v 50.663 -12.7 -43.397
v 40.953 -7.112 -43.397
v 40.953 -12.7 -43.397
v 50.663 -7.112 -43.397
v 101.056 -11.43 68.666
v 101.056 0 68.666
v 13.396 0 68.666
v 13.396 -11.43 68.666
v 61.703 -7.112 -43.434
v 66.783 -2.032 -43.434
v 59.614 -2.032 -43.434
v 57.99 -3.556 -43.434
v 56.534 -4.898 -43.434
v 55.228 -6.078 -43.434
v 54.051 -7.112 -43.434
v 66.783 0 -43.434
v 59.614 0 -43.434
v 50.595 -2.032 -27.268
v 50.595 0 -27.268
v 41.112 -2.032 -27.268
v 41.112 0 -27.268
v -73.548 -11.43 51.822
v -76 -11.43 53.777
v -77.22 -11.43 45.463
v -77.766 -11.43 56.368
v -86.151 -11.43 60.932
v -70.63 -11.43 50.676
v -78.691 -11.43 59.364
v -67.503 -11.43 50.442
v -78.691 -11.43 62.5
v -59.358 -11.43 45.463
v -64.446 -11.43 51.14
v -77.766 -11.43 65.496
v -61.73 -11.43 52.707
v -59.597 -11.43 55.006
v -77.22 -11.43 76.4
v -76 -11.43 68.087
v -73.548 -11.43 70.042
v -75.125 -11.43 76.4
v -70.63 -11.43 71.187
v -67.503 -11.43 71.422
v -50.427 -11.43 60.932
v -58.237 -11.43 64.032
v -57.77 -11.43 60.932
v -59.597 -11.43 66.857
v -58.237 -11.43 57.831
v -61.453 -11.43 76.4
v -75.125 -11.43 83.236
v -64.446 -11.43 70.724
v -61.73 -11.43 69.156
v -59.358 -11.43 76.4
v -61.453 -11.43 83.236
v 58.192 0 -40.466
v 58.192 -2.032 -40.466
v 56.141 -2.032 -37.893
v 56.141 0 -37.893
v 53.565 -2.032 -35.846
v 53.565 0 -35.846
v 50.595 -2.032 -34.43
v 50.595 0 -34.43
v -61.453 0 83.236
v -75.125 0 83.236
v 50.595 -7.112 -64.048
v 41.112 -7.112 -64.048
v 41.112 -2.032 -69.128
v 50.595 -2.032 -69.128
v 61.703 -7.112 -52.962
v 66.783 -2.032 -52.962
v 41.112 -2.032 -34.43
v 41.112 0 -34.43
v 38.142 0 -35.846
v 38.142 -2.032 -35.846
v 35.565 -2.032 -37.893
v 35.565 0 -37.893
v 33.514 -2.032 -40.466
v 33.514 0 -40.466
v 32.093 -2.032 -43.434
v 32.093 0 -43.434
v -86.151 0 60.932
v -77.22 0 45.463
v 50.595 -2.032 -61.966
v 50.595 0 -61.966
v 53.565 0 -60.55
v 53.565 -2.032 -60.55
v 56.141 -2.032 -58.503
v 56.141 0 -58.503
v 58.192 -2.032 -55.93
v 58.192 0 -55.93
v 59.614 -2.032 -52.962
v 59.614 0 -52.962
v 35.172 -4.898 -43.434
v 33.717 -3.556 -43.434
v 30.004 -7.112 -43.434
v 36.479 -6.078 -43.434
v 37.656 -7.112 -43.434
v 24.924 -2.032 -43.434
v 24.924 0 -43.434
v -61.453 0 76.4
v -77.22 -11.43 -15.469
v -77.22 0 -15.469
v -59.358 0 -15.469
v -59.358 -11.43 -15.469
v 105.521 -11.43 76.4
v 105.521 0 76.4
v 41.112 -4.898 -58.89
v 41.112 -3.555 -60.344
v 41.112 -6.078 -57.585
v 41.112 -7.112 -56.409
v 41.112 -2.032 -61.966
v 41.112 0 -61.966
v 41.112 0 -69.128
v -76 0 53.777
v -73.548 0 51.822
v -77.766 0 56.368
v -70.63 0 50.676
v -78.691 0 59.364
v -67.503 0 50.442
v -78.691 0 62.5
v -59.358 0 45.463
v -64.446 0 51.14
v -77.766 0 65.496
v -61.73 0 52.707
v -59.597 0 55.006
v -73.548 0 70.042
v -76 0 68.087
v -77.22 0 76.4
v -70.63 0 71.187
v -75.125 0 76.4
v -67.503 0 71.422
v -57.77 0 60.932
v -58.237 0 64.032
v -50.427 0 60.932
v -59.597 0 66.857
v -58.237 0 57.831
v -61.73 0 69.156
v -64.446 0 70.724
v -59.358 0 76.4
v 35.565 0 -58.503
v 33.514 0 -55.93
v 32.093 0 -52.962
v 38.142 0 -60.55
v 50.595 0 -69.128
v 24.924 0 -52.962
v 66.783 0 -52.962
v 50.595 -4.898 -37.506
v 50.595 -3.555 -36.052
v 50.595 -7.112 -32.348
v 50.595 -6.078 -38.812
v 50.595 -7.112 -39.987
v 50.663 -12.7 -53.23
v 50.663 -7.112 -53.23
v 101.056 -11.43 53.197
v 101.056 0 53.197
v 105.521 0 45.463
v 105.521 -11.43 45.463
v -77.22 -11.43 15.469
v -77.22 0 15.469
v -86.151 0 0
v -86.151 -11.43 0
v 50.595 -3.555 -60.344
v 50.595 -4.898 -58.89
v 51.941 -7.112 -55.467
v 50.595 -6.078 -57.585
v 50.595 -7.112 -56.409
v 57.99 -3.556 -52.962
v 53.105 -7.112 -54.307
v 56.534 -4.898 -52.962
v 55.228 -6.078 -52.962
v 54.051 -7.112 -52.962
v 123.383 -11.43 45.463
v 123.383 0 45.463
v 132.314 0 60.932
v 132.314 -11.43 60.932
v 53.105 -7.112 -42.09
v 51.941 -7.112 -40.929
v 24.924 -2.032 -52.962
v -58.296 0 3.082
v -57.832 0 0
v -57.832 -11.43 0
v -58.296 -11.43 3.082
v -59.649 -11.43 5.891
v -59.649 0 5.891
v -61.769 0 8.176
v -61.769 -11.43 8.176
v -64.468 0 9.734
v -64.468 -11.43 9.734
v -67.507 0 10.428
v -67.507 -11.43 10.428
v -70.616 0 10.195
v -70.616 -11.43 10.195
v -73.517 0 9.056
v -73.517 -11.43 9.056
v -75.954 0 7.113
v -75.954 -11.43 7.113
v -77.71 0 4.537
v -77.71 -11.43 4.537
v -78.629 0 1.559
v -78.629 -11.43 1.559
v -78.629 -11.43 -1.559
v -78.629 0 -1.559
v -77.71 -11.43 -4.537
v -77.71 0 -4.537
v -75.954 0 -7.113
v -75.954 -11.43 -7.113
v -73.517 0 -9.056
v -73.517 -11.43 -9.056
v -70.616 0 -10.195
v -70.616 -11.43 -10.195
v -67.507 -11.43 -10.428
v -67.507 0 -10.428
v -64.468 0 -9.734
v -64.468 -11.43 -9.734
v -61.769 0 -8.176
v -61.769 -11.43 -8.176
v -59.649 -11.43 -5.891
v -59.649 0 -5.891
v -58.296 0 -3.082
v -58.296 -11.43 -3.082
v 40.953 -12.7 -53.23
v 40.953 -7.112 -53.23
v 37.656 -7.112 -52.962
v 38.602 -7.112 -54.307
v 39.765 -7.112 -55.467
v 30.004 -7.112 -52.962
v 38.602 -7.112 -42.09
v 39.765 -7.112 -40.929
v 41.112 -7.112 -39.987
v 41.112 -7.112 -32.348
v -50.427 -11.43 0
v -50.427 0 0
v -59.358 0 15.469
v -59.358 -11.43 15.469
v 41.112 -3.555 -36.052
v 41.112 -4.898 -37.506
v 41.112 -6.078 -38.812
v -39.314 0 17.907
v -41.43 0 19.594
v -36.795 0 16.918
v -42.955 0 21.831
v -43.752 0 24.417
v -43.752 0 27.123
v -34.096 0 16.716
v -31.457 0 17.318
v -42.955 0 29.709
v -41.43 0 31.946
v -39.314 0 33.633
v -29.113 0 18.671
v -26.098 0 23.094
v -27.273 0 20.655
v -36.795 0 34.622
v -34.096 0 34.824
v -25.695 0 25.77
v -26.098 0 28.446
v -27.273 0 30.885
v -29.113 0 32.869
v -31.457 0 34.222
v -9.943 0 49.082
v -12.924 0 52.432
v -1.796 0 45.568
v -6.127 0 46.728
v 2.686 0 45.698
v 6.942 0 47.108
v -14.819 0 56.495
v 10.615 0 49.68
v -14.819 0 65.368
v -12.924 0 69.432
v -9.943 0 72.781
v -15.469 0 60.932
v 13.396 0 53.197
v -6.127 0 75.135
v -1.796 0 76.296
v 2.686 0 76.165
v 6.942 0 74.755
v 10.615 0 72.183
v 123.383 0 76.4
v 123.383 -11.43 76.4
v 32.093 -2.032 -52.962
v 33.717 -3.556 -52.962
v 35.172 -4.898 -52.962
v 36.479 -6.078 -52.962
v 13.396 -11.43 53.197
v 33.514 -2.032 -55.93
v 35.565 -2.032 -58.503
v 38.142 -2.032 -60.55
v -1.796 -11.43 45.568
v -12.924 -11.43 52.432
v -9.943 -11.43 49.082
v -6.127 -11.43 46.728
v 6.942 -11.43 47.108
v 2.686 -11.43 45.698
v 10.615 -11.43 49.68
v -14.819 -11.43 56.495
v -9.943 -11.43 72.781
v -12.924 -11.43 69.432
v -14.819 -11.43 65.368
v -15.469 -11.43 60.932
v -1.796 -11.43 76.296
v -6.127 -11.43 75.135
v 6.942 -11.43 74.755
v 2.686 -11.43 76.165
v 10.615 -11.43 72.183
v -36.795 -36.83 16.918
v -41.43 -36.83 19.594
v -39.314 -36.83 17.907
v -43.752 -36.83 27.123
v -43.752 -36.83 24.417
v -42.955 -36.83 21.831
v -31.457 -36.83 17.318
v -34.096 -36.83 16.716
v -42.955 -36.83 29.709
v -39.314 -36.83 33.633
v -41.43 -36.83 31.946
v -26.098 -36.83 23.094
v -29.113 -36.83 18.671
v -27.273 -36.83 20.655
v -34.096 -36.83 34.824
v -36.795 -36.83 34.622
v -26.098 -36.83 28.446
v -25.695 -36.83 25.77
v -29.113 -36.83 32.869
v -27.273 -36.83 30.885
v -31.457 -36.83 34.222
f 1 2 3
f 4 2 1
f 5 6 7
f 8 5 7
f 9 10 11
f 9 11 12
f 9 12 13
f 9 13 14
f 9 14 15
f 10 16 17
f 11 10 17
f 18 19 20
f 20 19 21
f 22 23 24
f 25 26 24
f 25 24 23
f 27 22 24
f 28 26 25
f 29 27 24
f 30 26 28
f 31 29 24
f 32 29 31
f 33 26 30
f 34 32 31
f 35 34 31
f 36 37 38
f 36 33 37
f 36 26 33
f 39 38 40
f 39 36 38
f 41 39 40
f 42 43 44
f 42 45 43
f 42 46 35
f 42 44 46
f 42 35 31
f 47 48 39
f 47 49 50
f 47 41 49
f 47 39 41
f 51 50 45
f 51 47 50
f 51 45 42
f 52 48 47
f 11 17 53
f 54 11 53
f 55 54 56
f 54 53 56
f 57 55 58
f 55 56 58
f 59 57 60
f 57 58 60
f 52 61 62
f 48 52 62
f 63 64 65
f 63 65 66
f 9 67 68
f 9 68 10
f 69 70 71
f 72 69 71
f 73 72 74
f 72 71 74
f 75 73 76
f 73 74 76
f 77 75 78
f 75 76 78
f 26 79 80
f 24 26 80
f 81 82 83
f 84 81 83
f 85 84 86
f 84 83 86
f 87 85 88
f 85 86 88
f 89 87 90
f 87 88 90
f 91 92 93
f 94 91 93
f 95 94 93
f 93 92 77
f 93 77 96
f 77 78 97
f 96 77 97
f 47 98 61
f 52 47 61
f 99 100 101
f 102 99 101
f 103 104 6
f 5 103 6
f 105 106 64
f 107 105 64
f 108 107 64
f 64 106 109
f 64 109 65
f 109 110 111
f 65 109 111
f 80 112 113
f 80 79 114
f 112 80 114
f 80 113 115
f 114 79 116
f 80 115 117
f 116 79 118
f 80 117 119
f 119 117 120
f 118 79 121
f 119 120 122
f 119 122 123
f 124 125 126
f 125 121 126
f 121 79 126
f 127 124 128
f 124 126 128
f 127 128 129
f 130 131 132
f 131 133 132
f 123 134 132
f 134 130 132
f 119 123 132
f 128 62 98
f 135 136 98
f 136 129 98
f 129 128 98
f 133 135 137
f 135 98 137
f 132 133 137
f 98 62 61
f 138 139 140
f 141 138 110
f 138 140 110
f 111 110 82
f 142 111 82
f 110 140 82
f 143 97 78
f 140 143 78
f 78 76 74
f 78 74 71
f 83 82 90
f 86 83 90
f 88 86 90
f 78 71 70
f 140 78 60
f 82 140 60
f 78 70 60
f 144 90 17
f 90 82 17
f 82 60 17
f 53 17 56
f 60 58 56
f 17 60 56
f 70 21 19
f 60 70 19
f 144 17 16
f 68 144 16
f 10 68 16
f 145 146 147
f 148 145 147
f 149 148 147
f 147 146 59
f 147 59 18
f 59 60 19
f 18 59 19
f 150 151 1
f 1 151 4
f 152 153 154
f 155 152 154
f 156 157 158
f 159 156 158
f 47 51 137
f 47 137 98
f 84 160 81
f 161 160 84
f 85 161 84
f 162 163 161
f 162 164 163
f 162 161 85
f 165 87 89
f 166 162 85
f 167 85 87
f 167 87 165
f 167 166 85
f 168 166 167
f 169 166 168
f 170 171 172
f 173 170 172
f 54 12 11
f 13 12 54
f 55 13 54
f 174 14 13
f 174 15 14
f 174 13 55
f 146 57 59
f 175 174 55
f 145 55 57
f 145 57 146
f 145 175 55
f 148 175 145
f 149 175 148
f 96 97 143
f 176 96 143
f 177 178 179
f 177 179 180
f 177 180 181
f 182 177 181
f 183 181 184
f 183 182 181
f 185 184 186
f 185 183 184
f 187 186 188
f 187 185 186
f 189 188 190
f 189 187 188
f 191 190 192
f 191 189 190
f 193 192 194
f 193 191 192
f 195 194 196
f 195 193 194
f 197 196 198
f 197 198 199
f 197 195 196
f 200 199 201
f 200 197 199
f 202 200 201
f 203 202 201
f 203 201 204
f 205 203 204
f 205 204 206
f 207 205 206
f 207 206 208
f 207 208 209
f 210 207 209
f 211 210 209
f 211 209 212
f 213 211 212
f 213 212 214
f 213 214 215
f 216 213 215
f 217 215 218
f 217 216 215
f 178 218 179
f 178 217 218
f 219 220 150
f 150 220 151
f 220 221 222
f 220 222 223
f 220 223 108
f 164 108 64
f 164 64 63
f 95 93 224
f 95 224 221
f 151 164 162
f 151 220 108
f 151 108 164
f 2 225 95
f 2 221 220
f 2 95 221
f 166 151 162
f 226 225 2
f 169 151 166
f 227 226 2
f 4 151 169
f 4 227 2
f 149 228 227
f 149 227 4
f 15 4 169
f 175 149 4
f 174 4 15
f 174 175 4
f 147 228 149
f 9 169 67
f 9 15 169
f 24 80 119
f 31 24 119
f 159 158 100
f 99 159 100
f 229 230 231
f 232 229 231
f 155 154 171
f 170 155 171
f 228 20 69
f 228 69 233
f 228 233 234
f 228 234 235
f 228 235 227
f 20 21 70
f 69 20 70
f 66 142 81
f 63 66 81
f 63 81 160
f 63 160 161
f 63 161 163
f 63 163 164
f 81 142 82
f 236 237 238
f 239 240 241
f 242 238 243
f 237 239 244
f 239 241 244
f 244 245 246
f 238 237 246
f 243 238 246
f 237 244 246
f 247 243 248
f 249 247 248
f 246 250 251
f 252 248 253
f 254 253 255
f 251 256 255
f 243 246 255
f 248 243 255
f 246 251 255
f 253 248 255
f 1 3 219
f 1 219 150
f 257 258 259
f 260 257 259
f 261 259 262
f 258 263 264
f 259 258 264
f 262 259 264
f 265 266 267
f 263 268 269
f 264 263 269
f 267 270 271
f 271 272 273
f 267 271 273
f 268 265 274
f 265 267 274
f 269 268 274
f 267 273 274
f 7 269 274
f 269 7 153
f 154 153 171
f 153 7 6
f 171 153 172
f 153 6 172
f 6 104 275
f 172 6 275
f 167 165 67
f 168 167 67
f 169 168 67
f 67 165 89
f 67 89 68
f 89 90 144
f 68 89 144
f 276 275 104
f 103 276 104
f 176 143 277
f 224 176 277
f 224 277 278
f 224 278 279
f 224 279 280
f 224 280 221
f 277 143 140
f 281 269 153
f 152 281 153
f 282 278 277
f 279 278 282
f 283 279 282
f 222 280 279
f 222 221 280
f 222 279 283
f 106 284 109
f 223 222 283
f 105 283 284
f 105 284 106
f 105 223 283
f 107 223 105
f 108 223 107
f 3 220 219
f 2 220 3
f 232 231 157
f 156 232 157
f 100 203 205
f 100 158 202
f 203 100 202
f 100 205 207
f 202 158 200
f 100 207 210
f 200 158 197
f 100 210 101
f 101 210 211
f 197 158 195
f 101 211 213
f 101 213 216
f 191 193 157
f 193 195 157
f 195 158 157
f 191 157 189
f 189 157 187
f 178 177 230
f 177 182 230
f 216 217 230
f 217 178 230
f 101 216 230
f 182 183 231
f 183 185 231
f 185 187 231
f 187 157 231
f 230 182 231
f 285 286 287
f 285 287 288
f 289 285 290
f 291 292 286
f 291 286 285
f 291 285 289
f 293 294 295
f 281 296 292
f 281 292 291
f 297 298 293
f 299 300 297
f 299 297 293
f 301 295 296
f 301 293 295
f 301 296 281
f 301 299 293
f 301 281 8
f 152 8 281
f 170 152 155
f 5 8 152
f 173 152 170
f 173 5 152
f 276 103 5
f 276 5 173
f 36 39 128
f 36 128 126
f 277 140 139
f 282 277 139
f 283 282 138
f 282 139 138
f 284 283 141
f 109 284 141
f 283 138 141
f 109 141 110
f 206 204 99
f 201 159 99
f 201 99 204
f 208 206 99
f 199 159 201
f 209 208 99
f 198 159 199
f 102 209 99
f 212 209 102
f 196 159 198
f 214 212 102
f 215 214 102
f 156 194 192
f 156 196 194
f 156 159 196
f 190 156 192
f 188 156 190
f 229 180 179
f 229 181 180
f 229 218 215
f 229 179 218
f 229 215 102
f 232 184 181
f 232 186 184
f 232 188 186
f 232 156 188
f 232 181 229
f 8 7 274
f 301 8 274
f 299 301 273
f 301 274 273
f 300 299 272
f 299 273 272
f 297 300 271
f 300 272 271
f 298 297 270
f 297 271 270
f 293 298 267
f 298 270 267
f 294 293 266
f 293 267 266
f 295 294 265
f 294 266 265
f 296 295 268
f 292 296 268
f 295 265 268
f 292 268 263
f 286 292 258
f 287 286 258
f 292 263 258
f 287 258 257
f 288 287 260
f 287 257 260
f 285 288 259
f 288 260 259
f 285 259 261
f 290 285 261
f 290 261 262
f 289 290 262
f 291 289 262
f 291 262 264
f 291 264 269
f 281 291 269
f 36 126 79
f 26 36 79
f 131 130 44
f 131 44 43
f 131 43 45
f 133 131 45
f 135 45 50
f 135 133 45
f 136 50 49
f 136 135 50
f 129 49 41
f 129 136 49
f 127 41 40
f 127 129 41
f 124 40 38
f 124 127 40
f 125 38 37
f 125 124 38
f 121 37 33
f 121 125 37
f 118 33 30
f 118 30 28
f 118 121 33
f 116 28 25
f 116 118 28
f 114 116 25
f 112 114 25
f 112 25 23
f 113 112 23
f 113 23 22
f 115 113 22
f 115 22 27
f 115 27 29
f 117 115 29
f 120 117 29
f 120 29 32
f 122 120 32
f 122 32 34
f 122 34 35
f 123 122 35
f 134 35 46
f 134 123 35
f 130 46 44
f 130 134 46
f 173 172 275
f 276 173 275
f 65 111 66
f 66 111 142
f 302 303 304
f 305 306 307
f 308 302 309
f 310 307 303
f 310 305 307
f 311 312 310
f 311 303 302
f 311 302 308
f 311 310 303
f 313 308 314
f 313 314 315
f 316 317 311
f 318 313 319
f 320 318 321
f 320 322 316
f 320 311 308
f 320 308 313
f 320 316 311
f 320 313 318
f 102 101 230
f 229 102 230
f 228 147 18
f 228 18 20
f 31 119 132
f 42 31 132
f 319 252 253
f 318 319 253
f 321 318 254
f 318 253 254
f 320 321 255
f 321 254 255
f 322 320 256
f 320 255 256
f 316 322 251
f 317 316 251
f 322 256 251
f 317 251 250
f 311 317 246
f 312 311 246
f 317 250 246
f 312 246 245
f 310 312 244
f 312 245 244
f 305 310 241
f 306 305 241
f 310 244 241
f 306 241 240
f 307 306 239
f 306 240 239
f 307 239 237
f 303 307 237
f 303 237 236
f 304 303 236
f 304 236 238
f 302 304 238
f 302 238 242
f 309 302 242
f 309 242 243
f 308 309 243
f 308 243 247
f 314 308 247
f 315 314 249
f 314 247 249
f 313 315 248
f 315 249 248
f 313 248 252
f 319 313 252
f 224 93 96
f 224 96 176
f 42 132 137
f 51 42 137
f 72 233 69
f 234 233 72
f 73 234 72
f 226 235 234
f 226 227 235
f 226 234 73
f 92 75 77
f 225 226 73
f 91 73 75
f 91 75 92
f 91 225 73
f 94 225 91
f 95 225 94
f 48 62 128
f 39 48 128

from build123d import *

# Parameters (mm, degrees)
F0_R      = 10.519302146
F1_DEPTH  = 11.43
F0_R_2    = 10.4571143602
F4_DEPTH  = 7.112
F5_SIZE   = 5.08
F6_W      = 9.7099430859
F6_H      = 9.8328515887
F7_DEPTH  = 12.7
F8_R      = 9.0793803352
F9_DEPTH  = 36.83
F10_DEPTH = 36.83


with BuildPart() as f1:
    # F0 (on Front) → F1 (new body)
    with BuildSketch(Plane.XZ):
        Polygon((-75.1246213913, 76.4004662633), (-77.2196794092, 76.4004662633), (-86.1505557177, 60.9317347407), (-77.2196794092, 45.4630032182), (-59.357926792, 45.4630032182), (-50.4270504834, 60.9317347407), (-59.357926792, 76.4004662633), (-61.4529848099, 76.4004662633), (-61.4529848099, 69.5646479726), (-68.2888031006, 76.4004662633), (-75.1246213913, 69.5646479726), align=None)
        with Locations((-68.2888031006, 60.9317347407)):
            Circle(F0_R, mode=Mode.SUBTRACT)
        Polygon((-75.1246213913, 83.236284554), (-75.1246213913, 76.4004662633), (-68.2888031006, 76.4004662633), (-61.4529848099, 76.4004662633), (-61.4529848099, 83.236284554), align=None)
        Polygon((-68.2888031006, 76.4004662633), (-75.1246213913, 76.4004662633), (-75.1246213913, 69.5646479726), align=None)
        Polygon((-61.4529848099, 76.4004662633), (-68.2888031006, 76.4004662633), (-61.4529848099, 69.5646479726), align=None)
    extrude(amount=F1_DEPTH)


with BuildPart() as f1b:
    # F0 (on Front) → F1, piece 2 (new body)
    with BuildSketch(Plane.XZ):
        with BuildLine():
            ThreePointArc((15.4687315226, 60.9317347407), (14.9416472776, 64.9353370624), (13.3963144629, 68.666100502))
            Line((13.3963144629, 68.666100502), (13.3963144629, 53.1973689795))
            ThreePointArc((13.3963144629, 53.1973689795), (14.9416472776, 56.9281324191), (15.4687315226, 60.9317347407))
        make_face()
        with BuildLine():
            Line((101.0556601675, 68.666100502), (13.3963144629, 68.666100502))
            ThreePointArc((13.3963144629, 68.666100502), (14.9416472776, 64.9353370624), (15.4687315226, 60.9317347407))
            ThreePointArc((15.4687315226, 60.9317347407), (14.9416472776, 56.9281324191), (13.3963144629, 53.1973689795))
            Line((13.3963144629, 53.1973689795), (101.0556601675, 53.1973689795))
            Line((101.0556601675, 53.1973689795), (96.5902220132, 60.9317347407))
            Line((96.5902220132, 60.9317347407), (101.0556601675, 68.666100502))
        make_face()
        with BuildLine():
            Line((13.3963144629, 53.1973689795), (13.3963144629, 68.666100502))
            ThreePointArc((13.3963144629, 68.666100502), (-15.4687315226, 60.9317347407), (13.3963144629, 53.1973689795))
        make_face()
        Polygon((105.5210983218, 76.4004662633), (101.0556601675, 68.666100502), (114.4519746304, 68.666100502), (114.4519746304, 53.1973689795), (101.0556601675, 53.1973689795), (105.5210983218, 45.4630032182), (123.3828509389, 45.4630032182), (132.3137272475, 60.9317347407), (123.3828509389, 76.4004662633), align=None)
        Polygon((114.4519746304, 68.666100502), (101.0556601675, 68.666100502), (96.5902220132, 60.9317347407), (101.0556601675, 53.1973689795), (114.4519746304, 53.1973689795), align=None)
    extrude(amount=F1_DEPTH)


with BuildPart() as f1c:
    # F0 (on Front) → F1, piece 3 (new body)
    with BuildSketch(Plane.XZ):
        Polygon((-59.357926792, -15.4687315226), (-50.4270504834, 0), (-59.357926792, 15.4687315226), (-77.2196794092, 15.4687315226), (-86.1505557177, 0), (-77.2196794092, -15.4687315226), align=None)
        with Locations((-68.2888031006, 0)):
            Circle(F0_R_2, mode=Mode.SUBTRACT)
    extrude(amount=F1_DEPTH)


with BuildPart() as f4:
    # F3 (on Front) → F4 (new body)
    with BuildSketch(Plane.XZ):
        with BuildLine():
            ThreePointArc((59.6135334386, -52.9624782503), (60.2132493643, -50.6137481904), (60.4150185059, -48.1980741024))
            ThreePointArc((60.4150185059, -48.1980741024), (60.2132493643, -45.7824000144), (59.6135334386, -43.4336699545))
            Line((59.6135334386, -43.4336699545), (50.5945459008, -43.4336699545))
            Line((50.5945459008, -43.4336699545), (50.5945459008, -52.9624782503))
            Line((50.5945459008, -52.9624782503), (59.6135334386, -52.9624782503))
        make_face()
        with BuildLine():
            ThreePointArc((59.6135334386, -43.4336699545), (60.2132493643, -45.7824000144), (60.4150185059, -48.1980741024))
            ThreePointArc((60.4150185059, -48.1980741024), (60.2132493643, -50.6137481904), (59.6135334386, -52.9624782503))
            Line((59.6135334386, -52.9624782503), (66.783182323, -52.9624782503))
            Line((66.783182323, -52.9624782503), (66.783182323, -43.4336699545))
            Line((66.783182323, -43.4336699545), (59.6135334386, -43.4336699545))
        make_face()
        with BuildLine():
            Line((50.5945459008, -43.4336699545), (59.6135334386, -43.4336699545))
            ThreePointArc((59.6135334386, -43.4336699545), (56.1413204063, -37.8927413191), (50.5945459008, -34.4298745776))
            Line((50.5945459008, -34.4298745776), (50.5945459008, -43.4336699545))
        make_face()
        with BuildLine():
            ThreePointArc((50.5945459008, -61.9662736272), (56.1413204063, -58.5034068857), (59.6135334386, -52.9624782503))
            Line((59.6135334386, -52.9624782503), (50.5945459008, -52.9624782503))
            Line((50.5945459008, -52.9624782503), (50.5945459008, -61.9662736272))
        make_face()
        with BuildLine():
            Line((50.5945459008, -43.4336699545), (50.5945459008, -34.4298745776))
            ThreePointArc((50.5945459008, -34.4298745776), (45.8533465862, -33.6364021827), (41.1121472716, -34.4298745776))
            Line((41.1121472716, -34.4298745776), (41.1121472716, -43.4336699545))
            Line((41.1121472716, -43.4336699545), (50.5945459008, -43.4336699545))
        make_face()
        with BuildLine():
            ThreePointArc((41.1121472716, -34.4298745776), (45.8533465862, -33.6364021827), (50.5945459008, -34.4298745776))
            Line((50.5945459008, -34.4298745776), (50.5945459008, -27.2682383657))
            Line((50.5945459008, -27.2682383657), (41.1121472716, -27.2682383657))
            Line((41.1121472716, -27.2682383657), (41.1121472716, -34.4298745776))
        make_face()
        with BuildLine():
            Line((50.5945459008, -69.1279098392), (50.5945459008, -61.9662736272))
            ThreePointArc((50.5945459008, -61.9662736272), (45.8533465862, -62.7597460221), (41.1121472716, -61.9662736272))
            Line((41.1121472716, -61.9662736272), (41.1121472716, -69.1279098392))
            Line((41.1121472716, -69.1279098392), (50.5945459008, -69.1279098392))
        make_face()
        with BuildLine():
            ThreePointArc((41.1121472716, -61.9662736272), (45.8533465862, -62.7597460221), (50.5945459008, -61.9662736272))
            Line((50.5945459008, -61.9662736272), (50.5945459008, -52.9624782503))
            Line((50.5945459008, -52.9624782503), (41.1121472716, -52.9624782503))
            Line((41.1121472716, -52.9624782503), (41.1121472716, -61.9662736272))
        make_face()
        with BuildLine():
            Line((41.1121472716, -43.4336699545), (41.1121472716, -34.4298745776))
            ThreePointArc((41.1121472716, -34.4298745776), (35.5653727662, -37.8927413191), (32.0931597339, -43.4336699545))
            Line((32.0931597339, -43.4336699545), (41.1121472716, -43.4336699545))
        make_face()
        with BuildLine():
            Line((41.1121472716, -52.9624782503), (41.1121472716, -43.4336699545))
            Line((41.1121472716, -43.4336699545), (32.0931597339, -43.4336699545))
            ThreePointArc((32.0931597339, -43.4336699545), (31.2916746666, -48.1980741024), (32.0931597339, -52.9624782503))
            Line((32.0931597339, -52.9624782503), (41.1121472716, -52.9624782503))
        make_face()
        with BuildLine():
            ThreePointArc((32.0931597339, -52.9624782503), (35.5653727662, -58.5034068857), (41.1121472716, -61.9662736272))
            Line((41.1121472716, -61.9662736272), (41.1121472716, -52.9624782503))
            Line((41.1121472716, -52.9624782503), (32.0931597339, -52.9624782503))
        make_face()
        with BuildLine():
            ThreePointArc((32.0931597339, -52.9624782503), (31.2916746666, -48.1980741024), (32.0931597339, -43.4336699545))
            Line((32.0931597339, -43.4336699545), (24.9235108495, -43.4336699545))
            Line((24.9235108495, -43.4336699545), (24.9235108495, -52.9624782503))
            Line((24.9235108495, -52.9624782503), (32.0931597339, -52.9624782503))
        make_face()
    extrude(amount=F4_DEPTH)

    # F5
    f5_edges = [f4.edges().sort_by_distance(p)[0] for p in [
        (45.853347, -7.112, -27.268238),
        (66.783182, -7.112, -48.198074),
        (45.853347, -7.112, -69.12791),
        (24.923511, -7.112, -48.198074),
        (56.14132, -7.112, -37.892741),
        (56.14132, -7.112, -58.503407),
        (35.565373, -7.112, -37.892741),
        (35.565373, -7.112, -58.503407),
    ]]
    chamfer(f5_edges, length=F5_SIZE)

    # F6 (on Front) → F7 (join)
    with BuildSketch(Plane.XZ):
        with Locations((45.8080749959, -48.3138300478)):
            Rectangle(F6_W, F6_H)
    extrude(amount=F7_DEPTH)


with BuildPart() as f9:
    # F8 (on Front) → F9 (new body)
    with BuildSketch(Plane.XZ):
        with Locations((-34.7743965685, 25.7699601352)):
            Circle(F8_R)
    extrude(amount=F9_DEPTH)

    # F8 (on Front) → F10 (join)
    with BuildSketch(Plane.XZ):
        with Locations((-34.7743965685, 25.7699601352)):
            Circle(F8_R)
    extrude(amount=F10_DEPTH)


solid = Compound([f1.part, f1b.part, f1c.part, f4.part, f9.part])
